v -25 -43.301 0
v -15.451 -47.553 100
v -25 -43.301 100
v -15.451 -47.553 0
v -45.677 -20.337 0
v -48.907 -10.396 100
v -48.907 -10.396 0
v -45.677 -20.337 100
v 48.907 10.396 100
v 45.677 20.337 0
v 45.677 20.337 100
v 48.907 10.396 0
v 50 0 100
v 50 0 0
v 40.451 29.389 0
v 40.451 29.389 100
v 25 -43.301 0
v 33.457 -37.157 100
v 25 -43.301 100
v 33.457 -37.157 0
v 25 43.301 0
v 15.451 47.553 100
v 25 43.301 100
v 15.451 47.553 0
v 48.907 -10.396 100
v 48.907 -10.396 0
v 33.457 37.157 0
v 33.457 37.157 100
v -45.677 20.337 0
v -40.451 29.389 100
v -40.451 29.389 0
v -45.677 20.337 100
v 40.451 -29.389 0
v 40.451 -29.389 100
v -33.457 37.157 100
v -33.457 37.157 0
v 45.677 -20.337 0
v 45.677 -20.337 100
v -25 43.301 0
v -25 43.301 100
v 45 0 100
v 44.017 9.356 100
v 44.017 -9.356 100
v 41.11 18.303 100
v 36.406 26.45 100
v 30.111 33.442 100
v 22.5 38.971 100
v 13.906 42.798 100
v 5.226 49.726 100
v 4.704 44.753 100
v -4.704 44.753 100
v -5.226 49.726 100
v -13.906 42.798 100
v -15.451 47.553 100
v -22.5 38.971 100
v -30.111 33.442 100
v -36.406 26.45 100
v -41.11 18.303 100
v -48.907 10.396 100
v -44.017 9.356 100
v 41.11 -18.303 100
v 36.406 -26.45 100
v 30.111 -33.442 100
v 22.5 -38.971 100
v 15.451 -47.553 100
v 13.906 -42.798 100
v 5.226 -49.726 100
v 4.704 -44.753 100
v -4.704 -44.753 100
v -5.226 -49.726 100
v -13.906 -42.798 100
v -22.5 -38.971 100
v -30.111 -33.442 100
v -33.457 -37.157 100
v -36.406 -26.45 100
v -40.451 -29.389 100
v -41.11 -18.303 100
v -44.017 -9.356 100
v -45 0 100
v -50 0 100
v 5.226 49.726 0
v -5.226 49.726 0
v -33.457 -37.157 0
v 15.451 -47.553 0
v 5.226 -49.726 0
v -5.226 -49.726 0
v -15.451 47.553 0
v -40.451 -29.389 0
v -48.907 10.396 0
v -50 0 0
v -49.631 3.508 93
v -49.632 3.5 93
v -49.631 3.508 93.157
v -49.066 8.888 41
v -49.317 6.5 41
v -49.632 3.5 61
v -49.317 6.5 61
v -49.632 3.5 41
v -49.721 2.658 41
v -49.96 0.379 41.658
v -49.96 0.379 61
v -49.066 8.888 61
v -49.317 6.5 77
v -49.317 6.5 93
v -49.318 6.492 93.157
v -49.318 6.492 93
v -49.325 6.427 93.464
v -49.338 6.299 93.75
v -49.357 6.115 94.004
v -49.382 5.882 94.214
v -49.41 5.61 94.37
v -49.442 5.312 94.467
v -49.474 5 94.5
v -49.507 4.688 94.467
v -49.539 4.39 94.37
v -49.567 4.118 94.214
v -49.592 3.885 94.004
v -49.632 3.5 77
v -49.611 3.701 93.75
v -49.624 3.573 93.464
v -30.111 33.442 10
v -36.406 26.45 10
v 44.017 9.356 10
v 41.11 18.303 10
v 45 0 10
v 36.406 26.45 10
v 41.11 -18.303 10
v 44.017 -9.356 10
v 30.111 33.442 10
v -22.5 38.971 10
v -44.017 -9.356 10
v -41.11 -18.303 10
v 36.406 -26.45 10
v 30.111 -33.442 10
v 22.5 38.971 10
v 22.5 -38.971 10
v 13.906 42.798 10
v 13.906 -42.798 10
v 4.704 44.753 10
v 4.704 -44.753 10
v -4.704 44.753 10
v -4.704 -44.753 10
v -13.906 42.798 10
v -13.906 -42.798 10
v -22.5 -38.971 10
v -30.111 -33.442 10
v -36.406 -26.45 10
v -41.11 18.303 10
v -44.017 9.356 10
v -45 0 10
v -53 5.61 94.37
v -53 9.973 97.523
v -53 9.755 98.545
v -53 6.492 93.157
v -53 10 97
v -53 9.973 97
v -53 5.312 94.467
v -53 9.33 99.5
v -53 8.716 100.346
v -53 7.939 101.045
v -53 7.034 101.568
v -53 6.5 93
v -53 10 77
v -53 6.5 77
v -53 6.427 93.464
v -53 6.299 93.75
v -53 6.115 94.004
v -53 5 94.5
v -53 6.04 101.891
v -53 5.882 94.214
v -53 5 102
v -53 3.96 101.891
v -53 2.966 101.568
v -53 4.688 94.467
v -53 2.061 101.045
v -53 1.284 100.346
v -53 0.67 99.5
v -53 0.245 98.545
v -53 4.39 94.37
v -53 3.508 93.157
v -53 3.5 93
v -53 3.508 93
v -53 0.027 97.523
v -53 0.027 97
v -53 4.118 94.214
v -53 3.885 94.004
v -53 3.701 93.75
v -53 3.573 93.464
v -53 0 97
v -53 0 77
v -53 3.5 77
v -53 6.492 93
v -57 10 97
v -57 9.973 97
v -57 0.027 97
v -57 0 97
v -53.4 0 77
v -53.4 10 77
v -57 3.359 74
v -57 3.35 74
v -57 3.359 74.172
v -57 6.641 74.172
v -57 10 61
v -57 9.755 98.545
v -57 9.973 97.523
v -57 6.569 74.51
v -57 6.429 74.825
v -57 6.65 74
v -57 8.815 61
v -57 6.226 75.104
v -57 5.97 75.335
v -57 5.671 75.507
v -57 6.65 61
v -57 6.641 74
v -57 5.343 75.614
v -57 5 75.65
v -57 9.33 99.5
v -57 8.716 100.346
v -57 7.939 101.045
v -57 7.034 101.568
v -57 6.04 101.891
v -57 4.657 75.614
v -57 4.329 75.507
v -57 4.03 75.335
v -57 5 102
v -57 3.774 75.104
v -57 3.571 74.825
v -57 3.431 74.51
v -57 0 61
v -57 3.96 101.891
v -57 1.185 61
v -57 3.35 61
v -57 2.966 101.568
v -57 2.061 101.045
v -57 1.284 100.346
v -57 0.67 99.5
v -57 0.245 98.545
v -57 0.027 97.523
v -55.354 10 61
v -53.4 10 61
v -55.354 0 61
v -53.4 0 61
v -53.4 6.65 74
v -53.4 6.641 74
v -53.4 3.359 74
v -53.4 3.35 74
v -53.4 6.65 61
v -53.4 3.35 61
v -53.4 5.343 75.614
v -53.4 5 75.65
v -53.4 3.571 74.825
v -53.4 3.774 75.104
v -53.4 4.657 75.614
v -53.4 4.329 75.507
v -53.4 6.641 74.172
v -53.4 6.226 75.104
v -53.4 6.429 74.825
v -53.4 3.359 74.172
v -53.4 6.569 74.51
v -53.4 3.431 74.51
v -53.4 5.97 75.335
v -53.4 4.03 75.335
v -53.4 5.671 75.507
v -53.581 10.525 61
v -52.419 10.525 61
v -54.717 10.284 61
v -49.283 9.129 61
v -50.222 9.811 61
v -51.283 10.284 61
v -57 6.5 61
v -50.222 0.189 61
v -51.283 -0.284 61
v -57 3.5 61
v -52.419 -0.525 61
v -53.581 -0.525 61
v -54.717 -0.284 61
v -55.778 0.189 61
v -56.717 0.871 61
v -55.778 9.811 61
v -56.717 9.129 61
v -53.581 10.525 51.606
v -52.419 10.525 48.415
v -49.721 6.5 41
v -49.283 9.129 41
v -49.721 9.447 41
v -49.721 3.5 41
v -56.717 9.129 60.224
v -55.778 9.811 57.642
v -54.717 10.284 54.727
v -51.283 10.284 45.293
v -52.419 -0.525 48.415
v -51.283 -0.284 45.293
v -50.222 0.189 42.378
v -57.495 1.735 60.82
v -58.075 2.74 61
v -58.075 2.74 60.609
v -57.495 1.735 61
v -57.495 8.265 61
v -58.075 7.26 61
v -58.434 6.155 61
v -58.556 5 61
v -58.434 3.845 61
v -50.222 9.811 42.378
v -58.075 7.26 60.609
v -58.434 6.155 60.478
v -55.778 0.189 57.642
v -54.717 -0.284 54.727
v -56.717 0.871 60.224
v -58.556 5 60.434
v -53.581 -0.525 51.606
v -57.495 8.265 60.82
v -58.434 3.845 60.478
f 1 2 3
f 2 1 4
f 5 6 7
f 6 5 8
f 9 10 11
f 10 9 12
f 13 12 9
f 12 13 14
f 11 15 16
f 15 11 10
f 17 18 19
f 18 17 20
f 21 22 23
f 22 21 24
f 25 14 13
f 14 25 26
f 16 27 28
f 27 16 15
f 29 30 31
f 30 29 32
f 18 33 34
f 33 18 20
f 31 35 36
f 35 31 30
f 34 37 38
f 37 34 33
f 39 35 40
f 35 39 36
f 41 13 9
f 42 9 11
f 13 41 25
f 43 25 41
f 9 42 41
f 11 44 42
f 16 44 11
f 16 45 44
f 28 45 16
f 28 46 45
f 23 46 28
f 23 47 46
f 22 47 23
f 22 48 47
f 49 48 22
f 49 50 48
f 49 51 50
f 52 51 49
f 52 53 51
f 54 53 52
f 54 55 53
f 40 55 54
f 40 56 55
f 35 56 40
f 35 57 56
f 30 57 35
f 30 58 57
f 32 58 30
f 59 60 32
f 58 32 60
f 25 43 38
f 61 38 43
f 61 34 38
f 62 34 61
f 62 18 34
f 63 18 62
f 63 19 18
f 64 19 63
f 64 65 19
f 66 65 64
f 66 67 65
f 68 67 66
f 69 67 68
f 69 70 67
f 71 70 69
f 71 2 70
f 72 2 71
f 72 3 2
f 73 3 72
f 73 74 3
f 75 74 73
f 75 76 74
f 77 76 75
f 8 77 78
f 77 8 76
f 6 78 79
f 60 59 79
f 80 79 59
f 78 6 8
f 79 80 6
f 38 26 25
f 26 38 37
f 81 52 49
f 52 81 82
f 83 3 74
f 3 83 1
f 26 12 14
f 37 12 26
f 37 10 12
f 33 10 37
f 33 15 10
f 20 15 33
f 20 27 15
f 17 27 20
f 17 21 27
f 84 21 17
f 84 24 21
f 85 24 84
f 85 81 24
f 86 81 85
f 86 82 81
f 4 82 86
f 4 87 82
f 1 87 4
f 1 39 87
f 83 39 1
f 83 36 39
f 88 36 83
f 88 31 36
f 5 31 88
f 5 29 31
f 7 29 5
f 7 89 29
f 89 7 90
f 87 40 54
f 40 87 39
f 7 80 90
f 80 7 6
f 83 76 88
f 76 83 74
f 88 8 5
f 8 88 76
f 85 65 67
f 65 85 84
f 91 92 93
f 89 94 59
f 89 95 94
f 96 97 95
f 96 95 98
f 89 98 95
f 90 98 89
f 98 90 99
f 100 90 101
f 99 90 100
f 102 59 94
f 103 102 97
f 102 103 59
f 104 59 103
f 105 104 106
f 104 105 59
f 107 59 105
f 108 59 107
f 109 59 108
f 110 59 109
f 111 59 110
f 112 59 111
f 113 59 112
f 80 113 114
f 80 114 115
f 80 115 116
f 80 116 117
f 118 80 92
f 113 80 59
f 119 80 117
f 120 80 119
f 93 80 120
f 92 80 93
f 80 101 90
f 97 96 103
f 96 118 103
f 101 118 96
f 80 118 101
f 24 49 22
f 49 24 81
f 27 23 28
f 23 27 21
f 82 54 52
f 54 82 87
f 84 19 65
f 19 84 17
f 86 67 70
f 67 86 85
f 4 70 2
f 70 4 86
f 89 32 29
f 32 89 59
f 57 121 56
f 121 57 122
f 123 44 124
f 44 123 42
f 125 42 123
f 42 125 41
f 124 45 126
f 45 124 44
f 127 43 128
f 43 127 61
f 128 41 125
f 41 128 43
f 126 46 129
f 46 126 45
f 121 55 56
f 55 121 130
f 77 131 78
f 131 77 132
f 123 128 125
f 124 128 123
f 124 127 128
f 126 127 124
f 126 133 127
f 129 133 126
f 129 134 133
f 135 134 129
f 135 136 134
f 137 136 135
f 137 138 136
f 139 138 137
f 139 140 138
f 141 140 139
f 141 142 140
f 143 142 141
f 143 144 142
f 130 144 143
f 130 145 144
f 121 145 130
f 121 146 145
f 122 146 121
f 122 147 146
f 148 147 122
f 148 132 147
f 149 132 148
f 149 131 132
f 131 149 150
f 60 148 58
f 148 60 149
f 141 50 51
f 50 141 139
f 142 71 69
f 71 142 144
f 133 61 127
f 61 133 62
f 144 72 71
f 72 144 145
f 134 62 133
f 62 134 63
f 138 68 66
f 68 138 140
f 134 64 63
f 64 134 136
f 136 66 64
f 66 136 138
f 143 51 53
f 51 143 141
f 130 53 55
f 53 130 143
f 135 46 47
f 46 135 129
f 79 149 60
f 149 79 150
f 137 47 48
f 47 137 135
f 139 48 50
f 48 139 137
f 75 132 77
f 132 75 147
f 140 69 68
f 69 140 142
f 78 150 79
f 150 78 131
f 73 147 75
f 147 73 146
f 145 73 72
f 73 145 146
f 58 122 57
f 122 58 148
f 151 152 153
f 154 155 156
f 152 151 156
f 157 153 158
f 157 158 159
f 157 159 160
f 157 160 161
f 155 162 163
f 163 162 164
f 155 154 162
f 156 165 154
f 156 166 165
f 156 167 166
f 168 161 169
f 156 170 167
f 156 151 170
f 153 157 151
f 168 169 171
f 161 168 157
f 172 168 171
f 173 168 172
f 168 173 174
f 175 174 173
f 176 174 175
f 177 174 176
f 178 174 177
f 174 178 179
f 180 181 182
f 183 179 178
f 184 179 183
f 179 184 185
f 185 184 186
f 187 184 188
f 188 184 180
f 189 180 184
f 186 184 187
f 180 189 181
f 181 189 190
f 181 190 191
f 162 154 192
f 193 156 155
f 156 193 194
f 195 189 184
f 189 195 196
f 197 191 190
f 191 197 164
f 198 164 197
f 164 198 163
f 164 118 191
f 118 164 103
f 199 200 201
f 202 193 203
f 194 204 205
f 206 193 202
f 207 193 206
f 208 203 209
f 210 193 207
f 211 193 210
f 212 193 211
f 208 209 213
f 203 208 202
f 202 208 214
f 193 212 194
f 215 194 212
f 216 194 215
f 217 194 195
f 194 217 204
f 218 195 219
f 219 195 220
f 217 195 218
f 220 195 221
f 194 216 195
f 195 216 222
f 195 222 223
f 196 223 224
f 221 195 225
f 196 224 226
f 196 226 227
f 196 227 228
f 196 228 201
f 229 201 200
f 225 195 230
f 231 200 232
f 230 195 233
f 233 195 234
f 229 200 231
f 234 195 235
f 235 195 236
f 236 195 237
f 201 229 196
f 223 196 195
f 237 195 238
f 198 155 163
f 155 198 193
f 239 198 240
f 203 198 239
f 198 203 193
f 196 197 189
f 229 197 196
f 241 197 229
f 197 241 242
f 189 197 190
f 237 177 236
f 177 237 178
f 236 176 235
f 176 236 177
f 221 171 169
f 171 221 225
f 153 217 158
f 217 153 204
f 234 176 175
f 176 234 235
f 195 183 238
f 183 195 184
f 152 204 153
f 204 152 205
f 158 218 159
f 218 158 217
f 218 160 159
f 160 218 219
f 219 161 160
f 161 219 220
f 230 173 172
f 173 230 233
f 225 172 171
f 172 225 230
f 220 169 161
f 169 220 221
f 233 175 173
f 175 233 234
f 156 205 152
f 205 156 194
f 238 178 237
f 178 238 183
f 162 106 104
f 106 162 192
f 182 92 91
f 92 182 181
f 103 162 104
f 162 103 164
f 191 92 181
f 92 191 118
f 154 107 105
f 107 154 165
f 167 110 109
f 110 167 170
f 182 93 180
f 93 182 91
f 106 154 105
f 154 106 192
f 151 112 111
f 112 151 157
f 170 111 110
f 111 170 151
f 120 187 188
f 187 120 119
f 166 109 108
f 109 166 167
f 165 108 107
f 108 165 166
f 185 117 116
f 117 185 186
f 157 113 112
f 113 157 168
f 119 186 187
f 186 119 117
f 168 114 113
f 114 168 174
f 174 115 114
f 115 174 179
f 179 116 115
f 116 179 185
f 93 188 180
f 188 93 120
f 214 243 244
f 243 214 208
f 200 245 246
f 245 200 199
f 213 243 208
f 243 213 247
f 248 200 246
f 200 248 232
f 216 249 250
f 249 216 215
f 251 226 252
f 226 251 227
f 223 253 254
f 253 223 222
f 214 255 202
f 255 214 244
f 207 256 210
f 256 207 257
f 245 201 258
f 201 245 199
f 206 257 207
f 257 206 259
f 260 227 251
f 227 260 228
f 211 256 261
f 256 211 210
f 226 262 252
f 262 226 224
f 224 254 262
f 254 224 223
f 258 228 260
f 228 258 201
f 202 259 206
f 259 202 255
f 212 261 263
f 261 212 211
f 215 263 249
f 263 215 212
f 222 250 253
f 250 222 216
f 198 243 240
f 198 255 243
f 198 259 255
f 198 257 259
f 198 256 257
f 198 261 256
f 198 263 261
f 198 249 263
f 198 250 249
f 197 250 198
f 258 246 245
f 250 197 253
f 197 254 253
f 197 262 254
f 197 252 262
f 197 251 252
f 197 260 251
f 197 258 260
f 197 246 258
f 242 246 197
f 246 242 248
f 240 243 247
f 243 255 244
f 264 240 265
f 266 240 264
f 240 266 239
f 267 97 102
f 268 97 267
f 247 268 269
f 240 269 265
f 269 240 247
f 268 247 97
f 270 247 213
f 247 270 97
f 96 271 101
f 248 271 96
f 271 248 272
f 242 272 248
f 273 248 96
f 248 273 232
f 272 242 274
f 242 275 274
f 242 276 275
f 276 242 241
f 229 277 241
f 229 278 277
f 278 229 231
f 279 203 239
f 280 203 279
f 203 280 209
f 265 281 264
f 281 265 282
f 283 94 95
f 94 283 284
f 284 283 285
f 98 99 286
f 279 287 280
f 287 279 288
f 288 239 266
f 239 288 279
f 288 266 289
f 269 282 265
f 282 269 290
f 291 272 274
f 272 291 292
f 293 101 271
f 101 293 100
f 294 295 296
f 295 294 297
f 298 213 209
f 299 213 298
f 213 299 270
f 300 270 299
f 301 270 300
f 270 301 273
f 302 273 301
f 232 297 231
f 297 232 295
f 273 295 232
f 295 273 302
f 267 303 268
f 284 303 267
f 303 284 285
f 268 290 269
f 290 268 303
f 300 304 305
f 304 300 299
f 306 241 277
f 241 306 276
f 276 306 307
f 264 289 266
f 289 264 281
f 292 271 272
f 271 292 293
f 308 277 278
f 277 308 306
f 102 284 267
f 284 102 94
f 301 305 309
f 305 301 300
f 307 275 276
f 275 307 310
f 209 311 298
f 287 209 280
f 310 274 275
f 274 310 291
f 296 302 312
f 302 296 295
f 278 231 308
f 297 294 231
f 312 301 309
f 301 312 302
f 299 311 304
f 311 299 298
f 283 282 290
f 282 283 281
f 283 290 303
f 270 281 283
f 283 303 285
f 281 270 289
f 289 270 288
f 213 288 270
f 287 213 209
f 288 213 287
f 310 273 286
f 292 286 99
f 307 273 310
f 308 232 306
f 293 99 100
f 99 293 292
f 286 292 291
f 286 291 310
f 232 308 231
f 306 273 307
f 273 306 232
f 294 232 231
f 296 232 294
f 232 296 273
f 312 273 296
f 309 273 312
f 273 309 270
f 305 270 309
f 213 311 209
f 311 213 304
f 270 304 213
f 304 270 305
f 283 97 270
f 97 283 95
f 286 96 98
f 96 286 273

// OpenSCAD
//  Mugs that clip together for easier carrying
//
//  Copyright 2012 John Cooper
//
//  This program is free software: you can redistribute it and/or modify
//  it under the terms of the GNU General Public License as published by
//  the Free Software Foundation, either version 3 of the License, or
//   (at your option) any later version.
//
//  This program is distributed in the hope that it will be useful,
//  but WITHOUT ANY WARRANTY; without even the implied warranty of
//  MERCHANTABILITY or FITNESS FOR A PARTICULAR PURPOSE.  See the
//  GNU General Public License for more details.
//
//  You should have received a copy of the GNU General Public License
//  along with this program.  If not, see <http://www.gnu.org/licenses/>.

// Make the curves more curvey
$fs=0.2;

module rounded_stick(height=10, width=5, depth=2) {
  cube ([depth, width, height]);
  translate ([0, width / 2, height]) {
    rotate ([0, 90, 0]) {
      cylinder (h=depth, r=width / 2 );
    }
  }
}

module top_clip() {
  c_width=10;
  c_height=20;
  c_depth=4;
  c_inner_width = c_width * 0.3;
  rounded_stick(height=c_height, width=c_width, depth=c_depth);
  translate ([c_depth, (c_width - c_inner_width ) / 2, 0]) {
    rounded_stick(height=c_height * 0.8, width=c_inner_width, depth=c_depth);
  }
  translate ([0, 0, -(c_height * 0.8)]) {
    difference () {
      cube ([c_depth * 0.9, c_width, c_height * 0.8]);
      translate ([-0.1, (c_width - c_inner_width * 1.1) / 2, -c_inner_width]) {
        rounded_stick(height=c_height * 0.8, width=c_inner_width * 1.1, depth=c_depth * 1.1);
      }
    }
  }
  translate ([c_depth, c_width / 2, -(c_height * 1.8 )]) {
    difference () {
      cylinder (h=c_height , r= c_width / 1.8);
      translate ([-c_depth, -c_width, c_height /1 ]) {
        rotate ([0,160,0]) {
          cube ([c_height, c_height, c_height * 2]);
        }
      }
      translate ([-c_depth, - c_inner_width / 2, -(c_height * 0.9) ]) {
        cube ([c_depth * 2 , c_inner_width, c_height * 2]);
      }
    }
  }
}



module handle () {
  // Just a plain handle
}

module cup () {
  difference () {
    cylinder (h=100, r=50);
    translate ([0, 0, 10]) {
      cylinder (h=900, r=45);
    }
  }
  translate ([-( 50 + 7 ), 0, 77]) {
    top_clip();
  }
}

module main () {
  cup();
}

main ();
